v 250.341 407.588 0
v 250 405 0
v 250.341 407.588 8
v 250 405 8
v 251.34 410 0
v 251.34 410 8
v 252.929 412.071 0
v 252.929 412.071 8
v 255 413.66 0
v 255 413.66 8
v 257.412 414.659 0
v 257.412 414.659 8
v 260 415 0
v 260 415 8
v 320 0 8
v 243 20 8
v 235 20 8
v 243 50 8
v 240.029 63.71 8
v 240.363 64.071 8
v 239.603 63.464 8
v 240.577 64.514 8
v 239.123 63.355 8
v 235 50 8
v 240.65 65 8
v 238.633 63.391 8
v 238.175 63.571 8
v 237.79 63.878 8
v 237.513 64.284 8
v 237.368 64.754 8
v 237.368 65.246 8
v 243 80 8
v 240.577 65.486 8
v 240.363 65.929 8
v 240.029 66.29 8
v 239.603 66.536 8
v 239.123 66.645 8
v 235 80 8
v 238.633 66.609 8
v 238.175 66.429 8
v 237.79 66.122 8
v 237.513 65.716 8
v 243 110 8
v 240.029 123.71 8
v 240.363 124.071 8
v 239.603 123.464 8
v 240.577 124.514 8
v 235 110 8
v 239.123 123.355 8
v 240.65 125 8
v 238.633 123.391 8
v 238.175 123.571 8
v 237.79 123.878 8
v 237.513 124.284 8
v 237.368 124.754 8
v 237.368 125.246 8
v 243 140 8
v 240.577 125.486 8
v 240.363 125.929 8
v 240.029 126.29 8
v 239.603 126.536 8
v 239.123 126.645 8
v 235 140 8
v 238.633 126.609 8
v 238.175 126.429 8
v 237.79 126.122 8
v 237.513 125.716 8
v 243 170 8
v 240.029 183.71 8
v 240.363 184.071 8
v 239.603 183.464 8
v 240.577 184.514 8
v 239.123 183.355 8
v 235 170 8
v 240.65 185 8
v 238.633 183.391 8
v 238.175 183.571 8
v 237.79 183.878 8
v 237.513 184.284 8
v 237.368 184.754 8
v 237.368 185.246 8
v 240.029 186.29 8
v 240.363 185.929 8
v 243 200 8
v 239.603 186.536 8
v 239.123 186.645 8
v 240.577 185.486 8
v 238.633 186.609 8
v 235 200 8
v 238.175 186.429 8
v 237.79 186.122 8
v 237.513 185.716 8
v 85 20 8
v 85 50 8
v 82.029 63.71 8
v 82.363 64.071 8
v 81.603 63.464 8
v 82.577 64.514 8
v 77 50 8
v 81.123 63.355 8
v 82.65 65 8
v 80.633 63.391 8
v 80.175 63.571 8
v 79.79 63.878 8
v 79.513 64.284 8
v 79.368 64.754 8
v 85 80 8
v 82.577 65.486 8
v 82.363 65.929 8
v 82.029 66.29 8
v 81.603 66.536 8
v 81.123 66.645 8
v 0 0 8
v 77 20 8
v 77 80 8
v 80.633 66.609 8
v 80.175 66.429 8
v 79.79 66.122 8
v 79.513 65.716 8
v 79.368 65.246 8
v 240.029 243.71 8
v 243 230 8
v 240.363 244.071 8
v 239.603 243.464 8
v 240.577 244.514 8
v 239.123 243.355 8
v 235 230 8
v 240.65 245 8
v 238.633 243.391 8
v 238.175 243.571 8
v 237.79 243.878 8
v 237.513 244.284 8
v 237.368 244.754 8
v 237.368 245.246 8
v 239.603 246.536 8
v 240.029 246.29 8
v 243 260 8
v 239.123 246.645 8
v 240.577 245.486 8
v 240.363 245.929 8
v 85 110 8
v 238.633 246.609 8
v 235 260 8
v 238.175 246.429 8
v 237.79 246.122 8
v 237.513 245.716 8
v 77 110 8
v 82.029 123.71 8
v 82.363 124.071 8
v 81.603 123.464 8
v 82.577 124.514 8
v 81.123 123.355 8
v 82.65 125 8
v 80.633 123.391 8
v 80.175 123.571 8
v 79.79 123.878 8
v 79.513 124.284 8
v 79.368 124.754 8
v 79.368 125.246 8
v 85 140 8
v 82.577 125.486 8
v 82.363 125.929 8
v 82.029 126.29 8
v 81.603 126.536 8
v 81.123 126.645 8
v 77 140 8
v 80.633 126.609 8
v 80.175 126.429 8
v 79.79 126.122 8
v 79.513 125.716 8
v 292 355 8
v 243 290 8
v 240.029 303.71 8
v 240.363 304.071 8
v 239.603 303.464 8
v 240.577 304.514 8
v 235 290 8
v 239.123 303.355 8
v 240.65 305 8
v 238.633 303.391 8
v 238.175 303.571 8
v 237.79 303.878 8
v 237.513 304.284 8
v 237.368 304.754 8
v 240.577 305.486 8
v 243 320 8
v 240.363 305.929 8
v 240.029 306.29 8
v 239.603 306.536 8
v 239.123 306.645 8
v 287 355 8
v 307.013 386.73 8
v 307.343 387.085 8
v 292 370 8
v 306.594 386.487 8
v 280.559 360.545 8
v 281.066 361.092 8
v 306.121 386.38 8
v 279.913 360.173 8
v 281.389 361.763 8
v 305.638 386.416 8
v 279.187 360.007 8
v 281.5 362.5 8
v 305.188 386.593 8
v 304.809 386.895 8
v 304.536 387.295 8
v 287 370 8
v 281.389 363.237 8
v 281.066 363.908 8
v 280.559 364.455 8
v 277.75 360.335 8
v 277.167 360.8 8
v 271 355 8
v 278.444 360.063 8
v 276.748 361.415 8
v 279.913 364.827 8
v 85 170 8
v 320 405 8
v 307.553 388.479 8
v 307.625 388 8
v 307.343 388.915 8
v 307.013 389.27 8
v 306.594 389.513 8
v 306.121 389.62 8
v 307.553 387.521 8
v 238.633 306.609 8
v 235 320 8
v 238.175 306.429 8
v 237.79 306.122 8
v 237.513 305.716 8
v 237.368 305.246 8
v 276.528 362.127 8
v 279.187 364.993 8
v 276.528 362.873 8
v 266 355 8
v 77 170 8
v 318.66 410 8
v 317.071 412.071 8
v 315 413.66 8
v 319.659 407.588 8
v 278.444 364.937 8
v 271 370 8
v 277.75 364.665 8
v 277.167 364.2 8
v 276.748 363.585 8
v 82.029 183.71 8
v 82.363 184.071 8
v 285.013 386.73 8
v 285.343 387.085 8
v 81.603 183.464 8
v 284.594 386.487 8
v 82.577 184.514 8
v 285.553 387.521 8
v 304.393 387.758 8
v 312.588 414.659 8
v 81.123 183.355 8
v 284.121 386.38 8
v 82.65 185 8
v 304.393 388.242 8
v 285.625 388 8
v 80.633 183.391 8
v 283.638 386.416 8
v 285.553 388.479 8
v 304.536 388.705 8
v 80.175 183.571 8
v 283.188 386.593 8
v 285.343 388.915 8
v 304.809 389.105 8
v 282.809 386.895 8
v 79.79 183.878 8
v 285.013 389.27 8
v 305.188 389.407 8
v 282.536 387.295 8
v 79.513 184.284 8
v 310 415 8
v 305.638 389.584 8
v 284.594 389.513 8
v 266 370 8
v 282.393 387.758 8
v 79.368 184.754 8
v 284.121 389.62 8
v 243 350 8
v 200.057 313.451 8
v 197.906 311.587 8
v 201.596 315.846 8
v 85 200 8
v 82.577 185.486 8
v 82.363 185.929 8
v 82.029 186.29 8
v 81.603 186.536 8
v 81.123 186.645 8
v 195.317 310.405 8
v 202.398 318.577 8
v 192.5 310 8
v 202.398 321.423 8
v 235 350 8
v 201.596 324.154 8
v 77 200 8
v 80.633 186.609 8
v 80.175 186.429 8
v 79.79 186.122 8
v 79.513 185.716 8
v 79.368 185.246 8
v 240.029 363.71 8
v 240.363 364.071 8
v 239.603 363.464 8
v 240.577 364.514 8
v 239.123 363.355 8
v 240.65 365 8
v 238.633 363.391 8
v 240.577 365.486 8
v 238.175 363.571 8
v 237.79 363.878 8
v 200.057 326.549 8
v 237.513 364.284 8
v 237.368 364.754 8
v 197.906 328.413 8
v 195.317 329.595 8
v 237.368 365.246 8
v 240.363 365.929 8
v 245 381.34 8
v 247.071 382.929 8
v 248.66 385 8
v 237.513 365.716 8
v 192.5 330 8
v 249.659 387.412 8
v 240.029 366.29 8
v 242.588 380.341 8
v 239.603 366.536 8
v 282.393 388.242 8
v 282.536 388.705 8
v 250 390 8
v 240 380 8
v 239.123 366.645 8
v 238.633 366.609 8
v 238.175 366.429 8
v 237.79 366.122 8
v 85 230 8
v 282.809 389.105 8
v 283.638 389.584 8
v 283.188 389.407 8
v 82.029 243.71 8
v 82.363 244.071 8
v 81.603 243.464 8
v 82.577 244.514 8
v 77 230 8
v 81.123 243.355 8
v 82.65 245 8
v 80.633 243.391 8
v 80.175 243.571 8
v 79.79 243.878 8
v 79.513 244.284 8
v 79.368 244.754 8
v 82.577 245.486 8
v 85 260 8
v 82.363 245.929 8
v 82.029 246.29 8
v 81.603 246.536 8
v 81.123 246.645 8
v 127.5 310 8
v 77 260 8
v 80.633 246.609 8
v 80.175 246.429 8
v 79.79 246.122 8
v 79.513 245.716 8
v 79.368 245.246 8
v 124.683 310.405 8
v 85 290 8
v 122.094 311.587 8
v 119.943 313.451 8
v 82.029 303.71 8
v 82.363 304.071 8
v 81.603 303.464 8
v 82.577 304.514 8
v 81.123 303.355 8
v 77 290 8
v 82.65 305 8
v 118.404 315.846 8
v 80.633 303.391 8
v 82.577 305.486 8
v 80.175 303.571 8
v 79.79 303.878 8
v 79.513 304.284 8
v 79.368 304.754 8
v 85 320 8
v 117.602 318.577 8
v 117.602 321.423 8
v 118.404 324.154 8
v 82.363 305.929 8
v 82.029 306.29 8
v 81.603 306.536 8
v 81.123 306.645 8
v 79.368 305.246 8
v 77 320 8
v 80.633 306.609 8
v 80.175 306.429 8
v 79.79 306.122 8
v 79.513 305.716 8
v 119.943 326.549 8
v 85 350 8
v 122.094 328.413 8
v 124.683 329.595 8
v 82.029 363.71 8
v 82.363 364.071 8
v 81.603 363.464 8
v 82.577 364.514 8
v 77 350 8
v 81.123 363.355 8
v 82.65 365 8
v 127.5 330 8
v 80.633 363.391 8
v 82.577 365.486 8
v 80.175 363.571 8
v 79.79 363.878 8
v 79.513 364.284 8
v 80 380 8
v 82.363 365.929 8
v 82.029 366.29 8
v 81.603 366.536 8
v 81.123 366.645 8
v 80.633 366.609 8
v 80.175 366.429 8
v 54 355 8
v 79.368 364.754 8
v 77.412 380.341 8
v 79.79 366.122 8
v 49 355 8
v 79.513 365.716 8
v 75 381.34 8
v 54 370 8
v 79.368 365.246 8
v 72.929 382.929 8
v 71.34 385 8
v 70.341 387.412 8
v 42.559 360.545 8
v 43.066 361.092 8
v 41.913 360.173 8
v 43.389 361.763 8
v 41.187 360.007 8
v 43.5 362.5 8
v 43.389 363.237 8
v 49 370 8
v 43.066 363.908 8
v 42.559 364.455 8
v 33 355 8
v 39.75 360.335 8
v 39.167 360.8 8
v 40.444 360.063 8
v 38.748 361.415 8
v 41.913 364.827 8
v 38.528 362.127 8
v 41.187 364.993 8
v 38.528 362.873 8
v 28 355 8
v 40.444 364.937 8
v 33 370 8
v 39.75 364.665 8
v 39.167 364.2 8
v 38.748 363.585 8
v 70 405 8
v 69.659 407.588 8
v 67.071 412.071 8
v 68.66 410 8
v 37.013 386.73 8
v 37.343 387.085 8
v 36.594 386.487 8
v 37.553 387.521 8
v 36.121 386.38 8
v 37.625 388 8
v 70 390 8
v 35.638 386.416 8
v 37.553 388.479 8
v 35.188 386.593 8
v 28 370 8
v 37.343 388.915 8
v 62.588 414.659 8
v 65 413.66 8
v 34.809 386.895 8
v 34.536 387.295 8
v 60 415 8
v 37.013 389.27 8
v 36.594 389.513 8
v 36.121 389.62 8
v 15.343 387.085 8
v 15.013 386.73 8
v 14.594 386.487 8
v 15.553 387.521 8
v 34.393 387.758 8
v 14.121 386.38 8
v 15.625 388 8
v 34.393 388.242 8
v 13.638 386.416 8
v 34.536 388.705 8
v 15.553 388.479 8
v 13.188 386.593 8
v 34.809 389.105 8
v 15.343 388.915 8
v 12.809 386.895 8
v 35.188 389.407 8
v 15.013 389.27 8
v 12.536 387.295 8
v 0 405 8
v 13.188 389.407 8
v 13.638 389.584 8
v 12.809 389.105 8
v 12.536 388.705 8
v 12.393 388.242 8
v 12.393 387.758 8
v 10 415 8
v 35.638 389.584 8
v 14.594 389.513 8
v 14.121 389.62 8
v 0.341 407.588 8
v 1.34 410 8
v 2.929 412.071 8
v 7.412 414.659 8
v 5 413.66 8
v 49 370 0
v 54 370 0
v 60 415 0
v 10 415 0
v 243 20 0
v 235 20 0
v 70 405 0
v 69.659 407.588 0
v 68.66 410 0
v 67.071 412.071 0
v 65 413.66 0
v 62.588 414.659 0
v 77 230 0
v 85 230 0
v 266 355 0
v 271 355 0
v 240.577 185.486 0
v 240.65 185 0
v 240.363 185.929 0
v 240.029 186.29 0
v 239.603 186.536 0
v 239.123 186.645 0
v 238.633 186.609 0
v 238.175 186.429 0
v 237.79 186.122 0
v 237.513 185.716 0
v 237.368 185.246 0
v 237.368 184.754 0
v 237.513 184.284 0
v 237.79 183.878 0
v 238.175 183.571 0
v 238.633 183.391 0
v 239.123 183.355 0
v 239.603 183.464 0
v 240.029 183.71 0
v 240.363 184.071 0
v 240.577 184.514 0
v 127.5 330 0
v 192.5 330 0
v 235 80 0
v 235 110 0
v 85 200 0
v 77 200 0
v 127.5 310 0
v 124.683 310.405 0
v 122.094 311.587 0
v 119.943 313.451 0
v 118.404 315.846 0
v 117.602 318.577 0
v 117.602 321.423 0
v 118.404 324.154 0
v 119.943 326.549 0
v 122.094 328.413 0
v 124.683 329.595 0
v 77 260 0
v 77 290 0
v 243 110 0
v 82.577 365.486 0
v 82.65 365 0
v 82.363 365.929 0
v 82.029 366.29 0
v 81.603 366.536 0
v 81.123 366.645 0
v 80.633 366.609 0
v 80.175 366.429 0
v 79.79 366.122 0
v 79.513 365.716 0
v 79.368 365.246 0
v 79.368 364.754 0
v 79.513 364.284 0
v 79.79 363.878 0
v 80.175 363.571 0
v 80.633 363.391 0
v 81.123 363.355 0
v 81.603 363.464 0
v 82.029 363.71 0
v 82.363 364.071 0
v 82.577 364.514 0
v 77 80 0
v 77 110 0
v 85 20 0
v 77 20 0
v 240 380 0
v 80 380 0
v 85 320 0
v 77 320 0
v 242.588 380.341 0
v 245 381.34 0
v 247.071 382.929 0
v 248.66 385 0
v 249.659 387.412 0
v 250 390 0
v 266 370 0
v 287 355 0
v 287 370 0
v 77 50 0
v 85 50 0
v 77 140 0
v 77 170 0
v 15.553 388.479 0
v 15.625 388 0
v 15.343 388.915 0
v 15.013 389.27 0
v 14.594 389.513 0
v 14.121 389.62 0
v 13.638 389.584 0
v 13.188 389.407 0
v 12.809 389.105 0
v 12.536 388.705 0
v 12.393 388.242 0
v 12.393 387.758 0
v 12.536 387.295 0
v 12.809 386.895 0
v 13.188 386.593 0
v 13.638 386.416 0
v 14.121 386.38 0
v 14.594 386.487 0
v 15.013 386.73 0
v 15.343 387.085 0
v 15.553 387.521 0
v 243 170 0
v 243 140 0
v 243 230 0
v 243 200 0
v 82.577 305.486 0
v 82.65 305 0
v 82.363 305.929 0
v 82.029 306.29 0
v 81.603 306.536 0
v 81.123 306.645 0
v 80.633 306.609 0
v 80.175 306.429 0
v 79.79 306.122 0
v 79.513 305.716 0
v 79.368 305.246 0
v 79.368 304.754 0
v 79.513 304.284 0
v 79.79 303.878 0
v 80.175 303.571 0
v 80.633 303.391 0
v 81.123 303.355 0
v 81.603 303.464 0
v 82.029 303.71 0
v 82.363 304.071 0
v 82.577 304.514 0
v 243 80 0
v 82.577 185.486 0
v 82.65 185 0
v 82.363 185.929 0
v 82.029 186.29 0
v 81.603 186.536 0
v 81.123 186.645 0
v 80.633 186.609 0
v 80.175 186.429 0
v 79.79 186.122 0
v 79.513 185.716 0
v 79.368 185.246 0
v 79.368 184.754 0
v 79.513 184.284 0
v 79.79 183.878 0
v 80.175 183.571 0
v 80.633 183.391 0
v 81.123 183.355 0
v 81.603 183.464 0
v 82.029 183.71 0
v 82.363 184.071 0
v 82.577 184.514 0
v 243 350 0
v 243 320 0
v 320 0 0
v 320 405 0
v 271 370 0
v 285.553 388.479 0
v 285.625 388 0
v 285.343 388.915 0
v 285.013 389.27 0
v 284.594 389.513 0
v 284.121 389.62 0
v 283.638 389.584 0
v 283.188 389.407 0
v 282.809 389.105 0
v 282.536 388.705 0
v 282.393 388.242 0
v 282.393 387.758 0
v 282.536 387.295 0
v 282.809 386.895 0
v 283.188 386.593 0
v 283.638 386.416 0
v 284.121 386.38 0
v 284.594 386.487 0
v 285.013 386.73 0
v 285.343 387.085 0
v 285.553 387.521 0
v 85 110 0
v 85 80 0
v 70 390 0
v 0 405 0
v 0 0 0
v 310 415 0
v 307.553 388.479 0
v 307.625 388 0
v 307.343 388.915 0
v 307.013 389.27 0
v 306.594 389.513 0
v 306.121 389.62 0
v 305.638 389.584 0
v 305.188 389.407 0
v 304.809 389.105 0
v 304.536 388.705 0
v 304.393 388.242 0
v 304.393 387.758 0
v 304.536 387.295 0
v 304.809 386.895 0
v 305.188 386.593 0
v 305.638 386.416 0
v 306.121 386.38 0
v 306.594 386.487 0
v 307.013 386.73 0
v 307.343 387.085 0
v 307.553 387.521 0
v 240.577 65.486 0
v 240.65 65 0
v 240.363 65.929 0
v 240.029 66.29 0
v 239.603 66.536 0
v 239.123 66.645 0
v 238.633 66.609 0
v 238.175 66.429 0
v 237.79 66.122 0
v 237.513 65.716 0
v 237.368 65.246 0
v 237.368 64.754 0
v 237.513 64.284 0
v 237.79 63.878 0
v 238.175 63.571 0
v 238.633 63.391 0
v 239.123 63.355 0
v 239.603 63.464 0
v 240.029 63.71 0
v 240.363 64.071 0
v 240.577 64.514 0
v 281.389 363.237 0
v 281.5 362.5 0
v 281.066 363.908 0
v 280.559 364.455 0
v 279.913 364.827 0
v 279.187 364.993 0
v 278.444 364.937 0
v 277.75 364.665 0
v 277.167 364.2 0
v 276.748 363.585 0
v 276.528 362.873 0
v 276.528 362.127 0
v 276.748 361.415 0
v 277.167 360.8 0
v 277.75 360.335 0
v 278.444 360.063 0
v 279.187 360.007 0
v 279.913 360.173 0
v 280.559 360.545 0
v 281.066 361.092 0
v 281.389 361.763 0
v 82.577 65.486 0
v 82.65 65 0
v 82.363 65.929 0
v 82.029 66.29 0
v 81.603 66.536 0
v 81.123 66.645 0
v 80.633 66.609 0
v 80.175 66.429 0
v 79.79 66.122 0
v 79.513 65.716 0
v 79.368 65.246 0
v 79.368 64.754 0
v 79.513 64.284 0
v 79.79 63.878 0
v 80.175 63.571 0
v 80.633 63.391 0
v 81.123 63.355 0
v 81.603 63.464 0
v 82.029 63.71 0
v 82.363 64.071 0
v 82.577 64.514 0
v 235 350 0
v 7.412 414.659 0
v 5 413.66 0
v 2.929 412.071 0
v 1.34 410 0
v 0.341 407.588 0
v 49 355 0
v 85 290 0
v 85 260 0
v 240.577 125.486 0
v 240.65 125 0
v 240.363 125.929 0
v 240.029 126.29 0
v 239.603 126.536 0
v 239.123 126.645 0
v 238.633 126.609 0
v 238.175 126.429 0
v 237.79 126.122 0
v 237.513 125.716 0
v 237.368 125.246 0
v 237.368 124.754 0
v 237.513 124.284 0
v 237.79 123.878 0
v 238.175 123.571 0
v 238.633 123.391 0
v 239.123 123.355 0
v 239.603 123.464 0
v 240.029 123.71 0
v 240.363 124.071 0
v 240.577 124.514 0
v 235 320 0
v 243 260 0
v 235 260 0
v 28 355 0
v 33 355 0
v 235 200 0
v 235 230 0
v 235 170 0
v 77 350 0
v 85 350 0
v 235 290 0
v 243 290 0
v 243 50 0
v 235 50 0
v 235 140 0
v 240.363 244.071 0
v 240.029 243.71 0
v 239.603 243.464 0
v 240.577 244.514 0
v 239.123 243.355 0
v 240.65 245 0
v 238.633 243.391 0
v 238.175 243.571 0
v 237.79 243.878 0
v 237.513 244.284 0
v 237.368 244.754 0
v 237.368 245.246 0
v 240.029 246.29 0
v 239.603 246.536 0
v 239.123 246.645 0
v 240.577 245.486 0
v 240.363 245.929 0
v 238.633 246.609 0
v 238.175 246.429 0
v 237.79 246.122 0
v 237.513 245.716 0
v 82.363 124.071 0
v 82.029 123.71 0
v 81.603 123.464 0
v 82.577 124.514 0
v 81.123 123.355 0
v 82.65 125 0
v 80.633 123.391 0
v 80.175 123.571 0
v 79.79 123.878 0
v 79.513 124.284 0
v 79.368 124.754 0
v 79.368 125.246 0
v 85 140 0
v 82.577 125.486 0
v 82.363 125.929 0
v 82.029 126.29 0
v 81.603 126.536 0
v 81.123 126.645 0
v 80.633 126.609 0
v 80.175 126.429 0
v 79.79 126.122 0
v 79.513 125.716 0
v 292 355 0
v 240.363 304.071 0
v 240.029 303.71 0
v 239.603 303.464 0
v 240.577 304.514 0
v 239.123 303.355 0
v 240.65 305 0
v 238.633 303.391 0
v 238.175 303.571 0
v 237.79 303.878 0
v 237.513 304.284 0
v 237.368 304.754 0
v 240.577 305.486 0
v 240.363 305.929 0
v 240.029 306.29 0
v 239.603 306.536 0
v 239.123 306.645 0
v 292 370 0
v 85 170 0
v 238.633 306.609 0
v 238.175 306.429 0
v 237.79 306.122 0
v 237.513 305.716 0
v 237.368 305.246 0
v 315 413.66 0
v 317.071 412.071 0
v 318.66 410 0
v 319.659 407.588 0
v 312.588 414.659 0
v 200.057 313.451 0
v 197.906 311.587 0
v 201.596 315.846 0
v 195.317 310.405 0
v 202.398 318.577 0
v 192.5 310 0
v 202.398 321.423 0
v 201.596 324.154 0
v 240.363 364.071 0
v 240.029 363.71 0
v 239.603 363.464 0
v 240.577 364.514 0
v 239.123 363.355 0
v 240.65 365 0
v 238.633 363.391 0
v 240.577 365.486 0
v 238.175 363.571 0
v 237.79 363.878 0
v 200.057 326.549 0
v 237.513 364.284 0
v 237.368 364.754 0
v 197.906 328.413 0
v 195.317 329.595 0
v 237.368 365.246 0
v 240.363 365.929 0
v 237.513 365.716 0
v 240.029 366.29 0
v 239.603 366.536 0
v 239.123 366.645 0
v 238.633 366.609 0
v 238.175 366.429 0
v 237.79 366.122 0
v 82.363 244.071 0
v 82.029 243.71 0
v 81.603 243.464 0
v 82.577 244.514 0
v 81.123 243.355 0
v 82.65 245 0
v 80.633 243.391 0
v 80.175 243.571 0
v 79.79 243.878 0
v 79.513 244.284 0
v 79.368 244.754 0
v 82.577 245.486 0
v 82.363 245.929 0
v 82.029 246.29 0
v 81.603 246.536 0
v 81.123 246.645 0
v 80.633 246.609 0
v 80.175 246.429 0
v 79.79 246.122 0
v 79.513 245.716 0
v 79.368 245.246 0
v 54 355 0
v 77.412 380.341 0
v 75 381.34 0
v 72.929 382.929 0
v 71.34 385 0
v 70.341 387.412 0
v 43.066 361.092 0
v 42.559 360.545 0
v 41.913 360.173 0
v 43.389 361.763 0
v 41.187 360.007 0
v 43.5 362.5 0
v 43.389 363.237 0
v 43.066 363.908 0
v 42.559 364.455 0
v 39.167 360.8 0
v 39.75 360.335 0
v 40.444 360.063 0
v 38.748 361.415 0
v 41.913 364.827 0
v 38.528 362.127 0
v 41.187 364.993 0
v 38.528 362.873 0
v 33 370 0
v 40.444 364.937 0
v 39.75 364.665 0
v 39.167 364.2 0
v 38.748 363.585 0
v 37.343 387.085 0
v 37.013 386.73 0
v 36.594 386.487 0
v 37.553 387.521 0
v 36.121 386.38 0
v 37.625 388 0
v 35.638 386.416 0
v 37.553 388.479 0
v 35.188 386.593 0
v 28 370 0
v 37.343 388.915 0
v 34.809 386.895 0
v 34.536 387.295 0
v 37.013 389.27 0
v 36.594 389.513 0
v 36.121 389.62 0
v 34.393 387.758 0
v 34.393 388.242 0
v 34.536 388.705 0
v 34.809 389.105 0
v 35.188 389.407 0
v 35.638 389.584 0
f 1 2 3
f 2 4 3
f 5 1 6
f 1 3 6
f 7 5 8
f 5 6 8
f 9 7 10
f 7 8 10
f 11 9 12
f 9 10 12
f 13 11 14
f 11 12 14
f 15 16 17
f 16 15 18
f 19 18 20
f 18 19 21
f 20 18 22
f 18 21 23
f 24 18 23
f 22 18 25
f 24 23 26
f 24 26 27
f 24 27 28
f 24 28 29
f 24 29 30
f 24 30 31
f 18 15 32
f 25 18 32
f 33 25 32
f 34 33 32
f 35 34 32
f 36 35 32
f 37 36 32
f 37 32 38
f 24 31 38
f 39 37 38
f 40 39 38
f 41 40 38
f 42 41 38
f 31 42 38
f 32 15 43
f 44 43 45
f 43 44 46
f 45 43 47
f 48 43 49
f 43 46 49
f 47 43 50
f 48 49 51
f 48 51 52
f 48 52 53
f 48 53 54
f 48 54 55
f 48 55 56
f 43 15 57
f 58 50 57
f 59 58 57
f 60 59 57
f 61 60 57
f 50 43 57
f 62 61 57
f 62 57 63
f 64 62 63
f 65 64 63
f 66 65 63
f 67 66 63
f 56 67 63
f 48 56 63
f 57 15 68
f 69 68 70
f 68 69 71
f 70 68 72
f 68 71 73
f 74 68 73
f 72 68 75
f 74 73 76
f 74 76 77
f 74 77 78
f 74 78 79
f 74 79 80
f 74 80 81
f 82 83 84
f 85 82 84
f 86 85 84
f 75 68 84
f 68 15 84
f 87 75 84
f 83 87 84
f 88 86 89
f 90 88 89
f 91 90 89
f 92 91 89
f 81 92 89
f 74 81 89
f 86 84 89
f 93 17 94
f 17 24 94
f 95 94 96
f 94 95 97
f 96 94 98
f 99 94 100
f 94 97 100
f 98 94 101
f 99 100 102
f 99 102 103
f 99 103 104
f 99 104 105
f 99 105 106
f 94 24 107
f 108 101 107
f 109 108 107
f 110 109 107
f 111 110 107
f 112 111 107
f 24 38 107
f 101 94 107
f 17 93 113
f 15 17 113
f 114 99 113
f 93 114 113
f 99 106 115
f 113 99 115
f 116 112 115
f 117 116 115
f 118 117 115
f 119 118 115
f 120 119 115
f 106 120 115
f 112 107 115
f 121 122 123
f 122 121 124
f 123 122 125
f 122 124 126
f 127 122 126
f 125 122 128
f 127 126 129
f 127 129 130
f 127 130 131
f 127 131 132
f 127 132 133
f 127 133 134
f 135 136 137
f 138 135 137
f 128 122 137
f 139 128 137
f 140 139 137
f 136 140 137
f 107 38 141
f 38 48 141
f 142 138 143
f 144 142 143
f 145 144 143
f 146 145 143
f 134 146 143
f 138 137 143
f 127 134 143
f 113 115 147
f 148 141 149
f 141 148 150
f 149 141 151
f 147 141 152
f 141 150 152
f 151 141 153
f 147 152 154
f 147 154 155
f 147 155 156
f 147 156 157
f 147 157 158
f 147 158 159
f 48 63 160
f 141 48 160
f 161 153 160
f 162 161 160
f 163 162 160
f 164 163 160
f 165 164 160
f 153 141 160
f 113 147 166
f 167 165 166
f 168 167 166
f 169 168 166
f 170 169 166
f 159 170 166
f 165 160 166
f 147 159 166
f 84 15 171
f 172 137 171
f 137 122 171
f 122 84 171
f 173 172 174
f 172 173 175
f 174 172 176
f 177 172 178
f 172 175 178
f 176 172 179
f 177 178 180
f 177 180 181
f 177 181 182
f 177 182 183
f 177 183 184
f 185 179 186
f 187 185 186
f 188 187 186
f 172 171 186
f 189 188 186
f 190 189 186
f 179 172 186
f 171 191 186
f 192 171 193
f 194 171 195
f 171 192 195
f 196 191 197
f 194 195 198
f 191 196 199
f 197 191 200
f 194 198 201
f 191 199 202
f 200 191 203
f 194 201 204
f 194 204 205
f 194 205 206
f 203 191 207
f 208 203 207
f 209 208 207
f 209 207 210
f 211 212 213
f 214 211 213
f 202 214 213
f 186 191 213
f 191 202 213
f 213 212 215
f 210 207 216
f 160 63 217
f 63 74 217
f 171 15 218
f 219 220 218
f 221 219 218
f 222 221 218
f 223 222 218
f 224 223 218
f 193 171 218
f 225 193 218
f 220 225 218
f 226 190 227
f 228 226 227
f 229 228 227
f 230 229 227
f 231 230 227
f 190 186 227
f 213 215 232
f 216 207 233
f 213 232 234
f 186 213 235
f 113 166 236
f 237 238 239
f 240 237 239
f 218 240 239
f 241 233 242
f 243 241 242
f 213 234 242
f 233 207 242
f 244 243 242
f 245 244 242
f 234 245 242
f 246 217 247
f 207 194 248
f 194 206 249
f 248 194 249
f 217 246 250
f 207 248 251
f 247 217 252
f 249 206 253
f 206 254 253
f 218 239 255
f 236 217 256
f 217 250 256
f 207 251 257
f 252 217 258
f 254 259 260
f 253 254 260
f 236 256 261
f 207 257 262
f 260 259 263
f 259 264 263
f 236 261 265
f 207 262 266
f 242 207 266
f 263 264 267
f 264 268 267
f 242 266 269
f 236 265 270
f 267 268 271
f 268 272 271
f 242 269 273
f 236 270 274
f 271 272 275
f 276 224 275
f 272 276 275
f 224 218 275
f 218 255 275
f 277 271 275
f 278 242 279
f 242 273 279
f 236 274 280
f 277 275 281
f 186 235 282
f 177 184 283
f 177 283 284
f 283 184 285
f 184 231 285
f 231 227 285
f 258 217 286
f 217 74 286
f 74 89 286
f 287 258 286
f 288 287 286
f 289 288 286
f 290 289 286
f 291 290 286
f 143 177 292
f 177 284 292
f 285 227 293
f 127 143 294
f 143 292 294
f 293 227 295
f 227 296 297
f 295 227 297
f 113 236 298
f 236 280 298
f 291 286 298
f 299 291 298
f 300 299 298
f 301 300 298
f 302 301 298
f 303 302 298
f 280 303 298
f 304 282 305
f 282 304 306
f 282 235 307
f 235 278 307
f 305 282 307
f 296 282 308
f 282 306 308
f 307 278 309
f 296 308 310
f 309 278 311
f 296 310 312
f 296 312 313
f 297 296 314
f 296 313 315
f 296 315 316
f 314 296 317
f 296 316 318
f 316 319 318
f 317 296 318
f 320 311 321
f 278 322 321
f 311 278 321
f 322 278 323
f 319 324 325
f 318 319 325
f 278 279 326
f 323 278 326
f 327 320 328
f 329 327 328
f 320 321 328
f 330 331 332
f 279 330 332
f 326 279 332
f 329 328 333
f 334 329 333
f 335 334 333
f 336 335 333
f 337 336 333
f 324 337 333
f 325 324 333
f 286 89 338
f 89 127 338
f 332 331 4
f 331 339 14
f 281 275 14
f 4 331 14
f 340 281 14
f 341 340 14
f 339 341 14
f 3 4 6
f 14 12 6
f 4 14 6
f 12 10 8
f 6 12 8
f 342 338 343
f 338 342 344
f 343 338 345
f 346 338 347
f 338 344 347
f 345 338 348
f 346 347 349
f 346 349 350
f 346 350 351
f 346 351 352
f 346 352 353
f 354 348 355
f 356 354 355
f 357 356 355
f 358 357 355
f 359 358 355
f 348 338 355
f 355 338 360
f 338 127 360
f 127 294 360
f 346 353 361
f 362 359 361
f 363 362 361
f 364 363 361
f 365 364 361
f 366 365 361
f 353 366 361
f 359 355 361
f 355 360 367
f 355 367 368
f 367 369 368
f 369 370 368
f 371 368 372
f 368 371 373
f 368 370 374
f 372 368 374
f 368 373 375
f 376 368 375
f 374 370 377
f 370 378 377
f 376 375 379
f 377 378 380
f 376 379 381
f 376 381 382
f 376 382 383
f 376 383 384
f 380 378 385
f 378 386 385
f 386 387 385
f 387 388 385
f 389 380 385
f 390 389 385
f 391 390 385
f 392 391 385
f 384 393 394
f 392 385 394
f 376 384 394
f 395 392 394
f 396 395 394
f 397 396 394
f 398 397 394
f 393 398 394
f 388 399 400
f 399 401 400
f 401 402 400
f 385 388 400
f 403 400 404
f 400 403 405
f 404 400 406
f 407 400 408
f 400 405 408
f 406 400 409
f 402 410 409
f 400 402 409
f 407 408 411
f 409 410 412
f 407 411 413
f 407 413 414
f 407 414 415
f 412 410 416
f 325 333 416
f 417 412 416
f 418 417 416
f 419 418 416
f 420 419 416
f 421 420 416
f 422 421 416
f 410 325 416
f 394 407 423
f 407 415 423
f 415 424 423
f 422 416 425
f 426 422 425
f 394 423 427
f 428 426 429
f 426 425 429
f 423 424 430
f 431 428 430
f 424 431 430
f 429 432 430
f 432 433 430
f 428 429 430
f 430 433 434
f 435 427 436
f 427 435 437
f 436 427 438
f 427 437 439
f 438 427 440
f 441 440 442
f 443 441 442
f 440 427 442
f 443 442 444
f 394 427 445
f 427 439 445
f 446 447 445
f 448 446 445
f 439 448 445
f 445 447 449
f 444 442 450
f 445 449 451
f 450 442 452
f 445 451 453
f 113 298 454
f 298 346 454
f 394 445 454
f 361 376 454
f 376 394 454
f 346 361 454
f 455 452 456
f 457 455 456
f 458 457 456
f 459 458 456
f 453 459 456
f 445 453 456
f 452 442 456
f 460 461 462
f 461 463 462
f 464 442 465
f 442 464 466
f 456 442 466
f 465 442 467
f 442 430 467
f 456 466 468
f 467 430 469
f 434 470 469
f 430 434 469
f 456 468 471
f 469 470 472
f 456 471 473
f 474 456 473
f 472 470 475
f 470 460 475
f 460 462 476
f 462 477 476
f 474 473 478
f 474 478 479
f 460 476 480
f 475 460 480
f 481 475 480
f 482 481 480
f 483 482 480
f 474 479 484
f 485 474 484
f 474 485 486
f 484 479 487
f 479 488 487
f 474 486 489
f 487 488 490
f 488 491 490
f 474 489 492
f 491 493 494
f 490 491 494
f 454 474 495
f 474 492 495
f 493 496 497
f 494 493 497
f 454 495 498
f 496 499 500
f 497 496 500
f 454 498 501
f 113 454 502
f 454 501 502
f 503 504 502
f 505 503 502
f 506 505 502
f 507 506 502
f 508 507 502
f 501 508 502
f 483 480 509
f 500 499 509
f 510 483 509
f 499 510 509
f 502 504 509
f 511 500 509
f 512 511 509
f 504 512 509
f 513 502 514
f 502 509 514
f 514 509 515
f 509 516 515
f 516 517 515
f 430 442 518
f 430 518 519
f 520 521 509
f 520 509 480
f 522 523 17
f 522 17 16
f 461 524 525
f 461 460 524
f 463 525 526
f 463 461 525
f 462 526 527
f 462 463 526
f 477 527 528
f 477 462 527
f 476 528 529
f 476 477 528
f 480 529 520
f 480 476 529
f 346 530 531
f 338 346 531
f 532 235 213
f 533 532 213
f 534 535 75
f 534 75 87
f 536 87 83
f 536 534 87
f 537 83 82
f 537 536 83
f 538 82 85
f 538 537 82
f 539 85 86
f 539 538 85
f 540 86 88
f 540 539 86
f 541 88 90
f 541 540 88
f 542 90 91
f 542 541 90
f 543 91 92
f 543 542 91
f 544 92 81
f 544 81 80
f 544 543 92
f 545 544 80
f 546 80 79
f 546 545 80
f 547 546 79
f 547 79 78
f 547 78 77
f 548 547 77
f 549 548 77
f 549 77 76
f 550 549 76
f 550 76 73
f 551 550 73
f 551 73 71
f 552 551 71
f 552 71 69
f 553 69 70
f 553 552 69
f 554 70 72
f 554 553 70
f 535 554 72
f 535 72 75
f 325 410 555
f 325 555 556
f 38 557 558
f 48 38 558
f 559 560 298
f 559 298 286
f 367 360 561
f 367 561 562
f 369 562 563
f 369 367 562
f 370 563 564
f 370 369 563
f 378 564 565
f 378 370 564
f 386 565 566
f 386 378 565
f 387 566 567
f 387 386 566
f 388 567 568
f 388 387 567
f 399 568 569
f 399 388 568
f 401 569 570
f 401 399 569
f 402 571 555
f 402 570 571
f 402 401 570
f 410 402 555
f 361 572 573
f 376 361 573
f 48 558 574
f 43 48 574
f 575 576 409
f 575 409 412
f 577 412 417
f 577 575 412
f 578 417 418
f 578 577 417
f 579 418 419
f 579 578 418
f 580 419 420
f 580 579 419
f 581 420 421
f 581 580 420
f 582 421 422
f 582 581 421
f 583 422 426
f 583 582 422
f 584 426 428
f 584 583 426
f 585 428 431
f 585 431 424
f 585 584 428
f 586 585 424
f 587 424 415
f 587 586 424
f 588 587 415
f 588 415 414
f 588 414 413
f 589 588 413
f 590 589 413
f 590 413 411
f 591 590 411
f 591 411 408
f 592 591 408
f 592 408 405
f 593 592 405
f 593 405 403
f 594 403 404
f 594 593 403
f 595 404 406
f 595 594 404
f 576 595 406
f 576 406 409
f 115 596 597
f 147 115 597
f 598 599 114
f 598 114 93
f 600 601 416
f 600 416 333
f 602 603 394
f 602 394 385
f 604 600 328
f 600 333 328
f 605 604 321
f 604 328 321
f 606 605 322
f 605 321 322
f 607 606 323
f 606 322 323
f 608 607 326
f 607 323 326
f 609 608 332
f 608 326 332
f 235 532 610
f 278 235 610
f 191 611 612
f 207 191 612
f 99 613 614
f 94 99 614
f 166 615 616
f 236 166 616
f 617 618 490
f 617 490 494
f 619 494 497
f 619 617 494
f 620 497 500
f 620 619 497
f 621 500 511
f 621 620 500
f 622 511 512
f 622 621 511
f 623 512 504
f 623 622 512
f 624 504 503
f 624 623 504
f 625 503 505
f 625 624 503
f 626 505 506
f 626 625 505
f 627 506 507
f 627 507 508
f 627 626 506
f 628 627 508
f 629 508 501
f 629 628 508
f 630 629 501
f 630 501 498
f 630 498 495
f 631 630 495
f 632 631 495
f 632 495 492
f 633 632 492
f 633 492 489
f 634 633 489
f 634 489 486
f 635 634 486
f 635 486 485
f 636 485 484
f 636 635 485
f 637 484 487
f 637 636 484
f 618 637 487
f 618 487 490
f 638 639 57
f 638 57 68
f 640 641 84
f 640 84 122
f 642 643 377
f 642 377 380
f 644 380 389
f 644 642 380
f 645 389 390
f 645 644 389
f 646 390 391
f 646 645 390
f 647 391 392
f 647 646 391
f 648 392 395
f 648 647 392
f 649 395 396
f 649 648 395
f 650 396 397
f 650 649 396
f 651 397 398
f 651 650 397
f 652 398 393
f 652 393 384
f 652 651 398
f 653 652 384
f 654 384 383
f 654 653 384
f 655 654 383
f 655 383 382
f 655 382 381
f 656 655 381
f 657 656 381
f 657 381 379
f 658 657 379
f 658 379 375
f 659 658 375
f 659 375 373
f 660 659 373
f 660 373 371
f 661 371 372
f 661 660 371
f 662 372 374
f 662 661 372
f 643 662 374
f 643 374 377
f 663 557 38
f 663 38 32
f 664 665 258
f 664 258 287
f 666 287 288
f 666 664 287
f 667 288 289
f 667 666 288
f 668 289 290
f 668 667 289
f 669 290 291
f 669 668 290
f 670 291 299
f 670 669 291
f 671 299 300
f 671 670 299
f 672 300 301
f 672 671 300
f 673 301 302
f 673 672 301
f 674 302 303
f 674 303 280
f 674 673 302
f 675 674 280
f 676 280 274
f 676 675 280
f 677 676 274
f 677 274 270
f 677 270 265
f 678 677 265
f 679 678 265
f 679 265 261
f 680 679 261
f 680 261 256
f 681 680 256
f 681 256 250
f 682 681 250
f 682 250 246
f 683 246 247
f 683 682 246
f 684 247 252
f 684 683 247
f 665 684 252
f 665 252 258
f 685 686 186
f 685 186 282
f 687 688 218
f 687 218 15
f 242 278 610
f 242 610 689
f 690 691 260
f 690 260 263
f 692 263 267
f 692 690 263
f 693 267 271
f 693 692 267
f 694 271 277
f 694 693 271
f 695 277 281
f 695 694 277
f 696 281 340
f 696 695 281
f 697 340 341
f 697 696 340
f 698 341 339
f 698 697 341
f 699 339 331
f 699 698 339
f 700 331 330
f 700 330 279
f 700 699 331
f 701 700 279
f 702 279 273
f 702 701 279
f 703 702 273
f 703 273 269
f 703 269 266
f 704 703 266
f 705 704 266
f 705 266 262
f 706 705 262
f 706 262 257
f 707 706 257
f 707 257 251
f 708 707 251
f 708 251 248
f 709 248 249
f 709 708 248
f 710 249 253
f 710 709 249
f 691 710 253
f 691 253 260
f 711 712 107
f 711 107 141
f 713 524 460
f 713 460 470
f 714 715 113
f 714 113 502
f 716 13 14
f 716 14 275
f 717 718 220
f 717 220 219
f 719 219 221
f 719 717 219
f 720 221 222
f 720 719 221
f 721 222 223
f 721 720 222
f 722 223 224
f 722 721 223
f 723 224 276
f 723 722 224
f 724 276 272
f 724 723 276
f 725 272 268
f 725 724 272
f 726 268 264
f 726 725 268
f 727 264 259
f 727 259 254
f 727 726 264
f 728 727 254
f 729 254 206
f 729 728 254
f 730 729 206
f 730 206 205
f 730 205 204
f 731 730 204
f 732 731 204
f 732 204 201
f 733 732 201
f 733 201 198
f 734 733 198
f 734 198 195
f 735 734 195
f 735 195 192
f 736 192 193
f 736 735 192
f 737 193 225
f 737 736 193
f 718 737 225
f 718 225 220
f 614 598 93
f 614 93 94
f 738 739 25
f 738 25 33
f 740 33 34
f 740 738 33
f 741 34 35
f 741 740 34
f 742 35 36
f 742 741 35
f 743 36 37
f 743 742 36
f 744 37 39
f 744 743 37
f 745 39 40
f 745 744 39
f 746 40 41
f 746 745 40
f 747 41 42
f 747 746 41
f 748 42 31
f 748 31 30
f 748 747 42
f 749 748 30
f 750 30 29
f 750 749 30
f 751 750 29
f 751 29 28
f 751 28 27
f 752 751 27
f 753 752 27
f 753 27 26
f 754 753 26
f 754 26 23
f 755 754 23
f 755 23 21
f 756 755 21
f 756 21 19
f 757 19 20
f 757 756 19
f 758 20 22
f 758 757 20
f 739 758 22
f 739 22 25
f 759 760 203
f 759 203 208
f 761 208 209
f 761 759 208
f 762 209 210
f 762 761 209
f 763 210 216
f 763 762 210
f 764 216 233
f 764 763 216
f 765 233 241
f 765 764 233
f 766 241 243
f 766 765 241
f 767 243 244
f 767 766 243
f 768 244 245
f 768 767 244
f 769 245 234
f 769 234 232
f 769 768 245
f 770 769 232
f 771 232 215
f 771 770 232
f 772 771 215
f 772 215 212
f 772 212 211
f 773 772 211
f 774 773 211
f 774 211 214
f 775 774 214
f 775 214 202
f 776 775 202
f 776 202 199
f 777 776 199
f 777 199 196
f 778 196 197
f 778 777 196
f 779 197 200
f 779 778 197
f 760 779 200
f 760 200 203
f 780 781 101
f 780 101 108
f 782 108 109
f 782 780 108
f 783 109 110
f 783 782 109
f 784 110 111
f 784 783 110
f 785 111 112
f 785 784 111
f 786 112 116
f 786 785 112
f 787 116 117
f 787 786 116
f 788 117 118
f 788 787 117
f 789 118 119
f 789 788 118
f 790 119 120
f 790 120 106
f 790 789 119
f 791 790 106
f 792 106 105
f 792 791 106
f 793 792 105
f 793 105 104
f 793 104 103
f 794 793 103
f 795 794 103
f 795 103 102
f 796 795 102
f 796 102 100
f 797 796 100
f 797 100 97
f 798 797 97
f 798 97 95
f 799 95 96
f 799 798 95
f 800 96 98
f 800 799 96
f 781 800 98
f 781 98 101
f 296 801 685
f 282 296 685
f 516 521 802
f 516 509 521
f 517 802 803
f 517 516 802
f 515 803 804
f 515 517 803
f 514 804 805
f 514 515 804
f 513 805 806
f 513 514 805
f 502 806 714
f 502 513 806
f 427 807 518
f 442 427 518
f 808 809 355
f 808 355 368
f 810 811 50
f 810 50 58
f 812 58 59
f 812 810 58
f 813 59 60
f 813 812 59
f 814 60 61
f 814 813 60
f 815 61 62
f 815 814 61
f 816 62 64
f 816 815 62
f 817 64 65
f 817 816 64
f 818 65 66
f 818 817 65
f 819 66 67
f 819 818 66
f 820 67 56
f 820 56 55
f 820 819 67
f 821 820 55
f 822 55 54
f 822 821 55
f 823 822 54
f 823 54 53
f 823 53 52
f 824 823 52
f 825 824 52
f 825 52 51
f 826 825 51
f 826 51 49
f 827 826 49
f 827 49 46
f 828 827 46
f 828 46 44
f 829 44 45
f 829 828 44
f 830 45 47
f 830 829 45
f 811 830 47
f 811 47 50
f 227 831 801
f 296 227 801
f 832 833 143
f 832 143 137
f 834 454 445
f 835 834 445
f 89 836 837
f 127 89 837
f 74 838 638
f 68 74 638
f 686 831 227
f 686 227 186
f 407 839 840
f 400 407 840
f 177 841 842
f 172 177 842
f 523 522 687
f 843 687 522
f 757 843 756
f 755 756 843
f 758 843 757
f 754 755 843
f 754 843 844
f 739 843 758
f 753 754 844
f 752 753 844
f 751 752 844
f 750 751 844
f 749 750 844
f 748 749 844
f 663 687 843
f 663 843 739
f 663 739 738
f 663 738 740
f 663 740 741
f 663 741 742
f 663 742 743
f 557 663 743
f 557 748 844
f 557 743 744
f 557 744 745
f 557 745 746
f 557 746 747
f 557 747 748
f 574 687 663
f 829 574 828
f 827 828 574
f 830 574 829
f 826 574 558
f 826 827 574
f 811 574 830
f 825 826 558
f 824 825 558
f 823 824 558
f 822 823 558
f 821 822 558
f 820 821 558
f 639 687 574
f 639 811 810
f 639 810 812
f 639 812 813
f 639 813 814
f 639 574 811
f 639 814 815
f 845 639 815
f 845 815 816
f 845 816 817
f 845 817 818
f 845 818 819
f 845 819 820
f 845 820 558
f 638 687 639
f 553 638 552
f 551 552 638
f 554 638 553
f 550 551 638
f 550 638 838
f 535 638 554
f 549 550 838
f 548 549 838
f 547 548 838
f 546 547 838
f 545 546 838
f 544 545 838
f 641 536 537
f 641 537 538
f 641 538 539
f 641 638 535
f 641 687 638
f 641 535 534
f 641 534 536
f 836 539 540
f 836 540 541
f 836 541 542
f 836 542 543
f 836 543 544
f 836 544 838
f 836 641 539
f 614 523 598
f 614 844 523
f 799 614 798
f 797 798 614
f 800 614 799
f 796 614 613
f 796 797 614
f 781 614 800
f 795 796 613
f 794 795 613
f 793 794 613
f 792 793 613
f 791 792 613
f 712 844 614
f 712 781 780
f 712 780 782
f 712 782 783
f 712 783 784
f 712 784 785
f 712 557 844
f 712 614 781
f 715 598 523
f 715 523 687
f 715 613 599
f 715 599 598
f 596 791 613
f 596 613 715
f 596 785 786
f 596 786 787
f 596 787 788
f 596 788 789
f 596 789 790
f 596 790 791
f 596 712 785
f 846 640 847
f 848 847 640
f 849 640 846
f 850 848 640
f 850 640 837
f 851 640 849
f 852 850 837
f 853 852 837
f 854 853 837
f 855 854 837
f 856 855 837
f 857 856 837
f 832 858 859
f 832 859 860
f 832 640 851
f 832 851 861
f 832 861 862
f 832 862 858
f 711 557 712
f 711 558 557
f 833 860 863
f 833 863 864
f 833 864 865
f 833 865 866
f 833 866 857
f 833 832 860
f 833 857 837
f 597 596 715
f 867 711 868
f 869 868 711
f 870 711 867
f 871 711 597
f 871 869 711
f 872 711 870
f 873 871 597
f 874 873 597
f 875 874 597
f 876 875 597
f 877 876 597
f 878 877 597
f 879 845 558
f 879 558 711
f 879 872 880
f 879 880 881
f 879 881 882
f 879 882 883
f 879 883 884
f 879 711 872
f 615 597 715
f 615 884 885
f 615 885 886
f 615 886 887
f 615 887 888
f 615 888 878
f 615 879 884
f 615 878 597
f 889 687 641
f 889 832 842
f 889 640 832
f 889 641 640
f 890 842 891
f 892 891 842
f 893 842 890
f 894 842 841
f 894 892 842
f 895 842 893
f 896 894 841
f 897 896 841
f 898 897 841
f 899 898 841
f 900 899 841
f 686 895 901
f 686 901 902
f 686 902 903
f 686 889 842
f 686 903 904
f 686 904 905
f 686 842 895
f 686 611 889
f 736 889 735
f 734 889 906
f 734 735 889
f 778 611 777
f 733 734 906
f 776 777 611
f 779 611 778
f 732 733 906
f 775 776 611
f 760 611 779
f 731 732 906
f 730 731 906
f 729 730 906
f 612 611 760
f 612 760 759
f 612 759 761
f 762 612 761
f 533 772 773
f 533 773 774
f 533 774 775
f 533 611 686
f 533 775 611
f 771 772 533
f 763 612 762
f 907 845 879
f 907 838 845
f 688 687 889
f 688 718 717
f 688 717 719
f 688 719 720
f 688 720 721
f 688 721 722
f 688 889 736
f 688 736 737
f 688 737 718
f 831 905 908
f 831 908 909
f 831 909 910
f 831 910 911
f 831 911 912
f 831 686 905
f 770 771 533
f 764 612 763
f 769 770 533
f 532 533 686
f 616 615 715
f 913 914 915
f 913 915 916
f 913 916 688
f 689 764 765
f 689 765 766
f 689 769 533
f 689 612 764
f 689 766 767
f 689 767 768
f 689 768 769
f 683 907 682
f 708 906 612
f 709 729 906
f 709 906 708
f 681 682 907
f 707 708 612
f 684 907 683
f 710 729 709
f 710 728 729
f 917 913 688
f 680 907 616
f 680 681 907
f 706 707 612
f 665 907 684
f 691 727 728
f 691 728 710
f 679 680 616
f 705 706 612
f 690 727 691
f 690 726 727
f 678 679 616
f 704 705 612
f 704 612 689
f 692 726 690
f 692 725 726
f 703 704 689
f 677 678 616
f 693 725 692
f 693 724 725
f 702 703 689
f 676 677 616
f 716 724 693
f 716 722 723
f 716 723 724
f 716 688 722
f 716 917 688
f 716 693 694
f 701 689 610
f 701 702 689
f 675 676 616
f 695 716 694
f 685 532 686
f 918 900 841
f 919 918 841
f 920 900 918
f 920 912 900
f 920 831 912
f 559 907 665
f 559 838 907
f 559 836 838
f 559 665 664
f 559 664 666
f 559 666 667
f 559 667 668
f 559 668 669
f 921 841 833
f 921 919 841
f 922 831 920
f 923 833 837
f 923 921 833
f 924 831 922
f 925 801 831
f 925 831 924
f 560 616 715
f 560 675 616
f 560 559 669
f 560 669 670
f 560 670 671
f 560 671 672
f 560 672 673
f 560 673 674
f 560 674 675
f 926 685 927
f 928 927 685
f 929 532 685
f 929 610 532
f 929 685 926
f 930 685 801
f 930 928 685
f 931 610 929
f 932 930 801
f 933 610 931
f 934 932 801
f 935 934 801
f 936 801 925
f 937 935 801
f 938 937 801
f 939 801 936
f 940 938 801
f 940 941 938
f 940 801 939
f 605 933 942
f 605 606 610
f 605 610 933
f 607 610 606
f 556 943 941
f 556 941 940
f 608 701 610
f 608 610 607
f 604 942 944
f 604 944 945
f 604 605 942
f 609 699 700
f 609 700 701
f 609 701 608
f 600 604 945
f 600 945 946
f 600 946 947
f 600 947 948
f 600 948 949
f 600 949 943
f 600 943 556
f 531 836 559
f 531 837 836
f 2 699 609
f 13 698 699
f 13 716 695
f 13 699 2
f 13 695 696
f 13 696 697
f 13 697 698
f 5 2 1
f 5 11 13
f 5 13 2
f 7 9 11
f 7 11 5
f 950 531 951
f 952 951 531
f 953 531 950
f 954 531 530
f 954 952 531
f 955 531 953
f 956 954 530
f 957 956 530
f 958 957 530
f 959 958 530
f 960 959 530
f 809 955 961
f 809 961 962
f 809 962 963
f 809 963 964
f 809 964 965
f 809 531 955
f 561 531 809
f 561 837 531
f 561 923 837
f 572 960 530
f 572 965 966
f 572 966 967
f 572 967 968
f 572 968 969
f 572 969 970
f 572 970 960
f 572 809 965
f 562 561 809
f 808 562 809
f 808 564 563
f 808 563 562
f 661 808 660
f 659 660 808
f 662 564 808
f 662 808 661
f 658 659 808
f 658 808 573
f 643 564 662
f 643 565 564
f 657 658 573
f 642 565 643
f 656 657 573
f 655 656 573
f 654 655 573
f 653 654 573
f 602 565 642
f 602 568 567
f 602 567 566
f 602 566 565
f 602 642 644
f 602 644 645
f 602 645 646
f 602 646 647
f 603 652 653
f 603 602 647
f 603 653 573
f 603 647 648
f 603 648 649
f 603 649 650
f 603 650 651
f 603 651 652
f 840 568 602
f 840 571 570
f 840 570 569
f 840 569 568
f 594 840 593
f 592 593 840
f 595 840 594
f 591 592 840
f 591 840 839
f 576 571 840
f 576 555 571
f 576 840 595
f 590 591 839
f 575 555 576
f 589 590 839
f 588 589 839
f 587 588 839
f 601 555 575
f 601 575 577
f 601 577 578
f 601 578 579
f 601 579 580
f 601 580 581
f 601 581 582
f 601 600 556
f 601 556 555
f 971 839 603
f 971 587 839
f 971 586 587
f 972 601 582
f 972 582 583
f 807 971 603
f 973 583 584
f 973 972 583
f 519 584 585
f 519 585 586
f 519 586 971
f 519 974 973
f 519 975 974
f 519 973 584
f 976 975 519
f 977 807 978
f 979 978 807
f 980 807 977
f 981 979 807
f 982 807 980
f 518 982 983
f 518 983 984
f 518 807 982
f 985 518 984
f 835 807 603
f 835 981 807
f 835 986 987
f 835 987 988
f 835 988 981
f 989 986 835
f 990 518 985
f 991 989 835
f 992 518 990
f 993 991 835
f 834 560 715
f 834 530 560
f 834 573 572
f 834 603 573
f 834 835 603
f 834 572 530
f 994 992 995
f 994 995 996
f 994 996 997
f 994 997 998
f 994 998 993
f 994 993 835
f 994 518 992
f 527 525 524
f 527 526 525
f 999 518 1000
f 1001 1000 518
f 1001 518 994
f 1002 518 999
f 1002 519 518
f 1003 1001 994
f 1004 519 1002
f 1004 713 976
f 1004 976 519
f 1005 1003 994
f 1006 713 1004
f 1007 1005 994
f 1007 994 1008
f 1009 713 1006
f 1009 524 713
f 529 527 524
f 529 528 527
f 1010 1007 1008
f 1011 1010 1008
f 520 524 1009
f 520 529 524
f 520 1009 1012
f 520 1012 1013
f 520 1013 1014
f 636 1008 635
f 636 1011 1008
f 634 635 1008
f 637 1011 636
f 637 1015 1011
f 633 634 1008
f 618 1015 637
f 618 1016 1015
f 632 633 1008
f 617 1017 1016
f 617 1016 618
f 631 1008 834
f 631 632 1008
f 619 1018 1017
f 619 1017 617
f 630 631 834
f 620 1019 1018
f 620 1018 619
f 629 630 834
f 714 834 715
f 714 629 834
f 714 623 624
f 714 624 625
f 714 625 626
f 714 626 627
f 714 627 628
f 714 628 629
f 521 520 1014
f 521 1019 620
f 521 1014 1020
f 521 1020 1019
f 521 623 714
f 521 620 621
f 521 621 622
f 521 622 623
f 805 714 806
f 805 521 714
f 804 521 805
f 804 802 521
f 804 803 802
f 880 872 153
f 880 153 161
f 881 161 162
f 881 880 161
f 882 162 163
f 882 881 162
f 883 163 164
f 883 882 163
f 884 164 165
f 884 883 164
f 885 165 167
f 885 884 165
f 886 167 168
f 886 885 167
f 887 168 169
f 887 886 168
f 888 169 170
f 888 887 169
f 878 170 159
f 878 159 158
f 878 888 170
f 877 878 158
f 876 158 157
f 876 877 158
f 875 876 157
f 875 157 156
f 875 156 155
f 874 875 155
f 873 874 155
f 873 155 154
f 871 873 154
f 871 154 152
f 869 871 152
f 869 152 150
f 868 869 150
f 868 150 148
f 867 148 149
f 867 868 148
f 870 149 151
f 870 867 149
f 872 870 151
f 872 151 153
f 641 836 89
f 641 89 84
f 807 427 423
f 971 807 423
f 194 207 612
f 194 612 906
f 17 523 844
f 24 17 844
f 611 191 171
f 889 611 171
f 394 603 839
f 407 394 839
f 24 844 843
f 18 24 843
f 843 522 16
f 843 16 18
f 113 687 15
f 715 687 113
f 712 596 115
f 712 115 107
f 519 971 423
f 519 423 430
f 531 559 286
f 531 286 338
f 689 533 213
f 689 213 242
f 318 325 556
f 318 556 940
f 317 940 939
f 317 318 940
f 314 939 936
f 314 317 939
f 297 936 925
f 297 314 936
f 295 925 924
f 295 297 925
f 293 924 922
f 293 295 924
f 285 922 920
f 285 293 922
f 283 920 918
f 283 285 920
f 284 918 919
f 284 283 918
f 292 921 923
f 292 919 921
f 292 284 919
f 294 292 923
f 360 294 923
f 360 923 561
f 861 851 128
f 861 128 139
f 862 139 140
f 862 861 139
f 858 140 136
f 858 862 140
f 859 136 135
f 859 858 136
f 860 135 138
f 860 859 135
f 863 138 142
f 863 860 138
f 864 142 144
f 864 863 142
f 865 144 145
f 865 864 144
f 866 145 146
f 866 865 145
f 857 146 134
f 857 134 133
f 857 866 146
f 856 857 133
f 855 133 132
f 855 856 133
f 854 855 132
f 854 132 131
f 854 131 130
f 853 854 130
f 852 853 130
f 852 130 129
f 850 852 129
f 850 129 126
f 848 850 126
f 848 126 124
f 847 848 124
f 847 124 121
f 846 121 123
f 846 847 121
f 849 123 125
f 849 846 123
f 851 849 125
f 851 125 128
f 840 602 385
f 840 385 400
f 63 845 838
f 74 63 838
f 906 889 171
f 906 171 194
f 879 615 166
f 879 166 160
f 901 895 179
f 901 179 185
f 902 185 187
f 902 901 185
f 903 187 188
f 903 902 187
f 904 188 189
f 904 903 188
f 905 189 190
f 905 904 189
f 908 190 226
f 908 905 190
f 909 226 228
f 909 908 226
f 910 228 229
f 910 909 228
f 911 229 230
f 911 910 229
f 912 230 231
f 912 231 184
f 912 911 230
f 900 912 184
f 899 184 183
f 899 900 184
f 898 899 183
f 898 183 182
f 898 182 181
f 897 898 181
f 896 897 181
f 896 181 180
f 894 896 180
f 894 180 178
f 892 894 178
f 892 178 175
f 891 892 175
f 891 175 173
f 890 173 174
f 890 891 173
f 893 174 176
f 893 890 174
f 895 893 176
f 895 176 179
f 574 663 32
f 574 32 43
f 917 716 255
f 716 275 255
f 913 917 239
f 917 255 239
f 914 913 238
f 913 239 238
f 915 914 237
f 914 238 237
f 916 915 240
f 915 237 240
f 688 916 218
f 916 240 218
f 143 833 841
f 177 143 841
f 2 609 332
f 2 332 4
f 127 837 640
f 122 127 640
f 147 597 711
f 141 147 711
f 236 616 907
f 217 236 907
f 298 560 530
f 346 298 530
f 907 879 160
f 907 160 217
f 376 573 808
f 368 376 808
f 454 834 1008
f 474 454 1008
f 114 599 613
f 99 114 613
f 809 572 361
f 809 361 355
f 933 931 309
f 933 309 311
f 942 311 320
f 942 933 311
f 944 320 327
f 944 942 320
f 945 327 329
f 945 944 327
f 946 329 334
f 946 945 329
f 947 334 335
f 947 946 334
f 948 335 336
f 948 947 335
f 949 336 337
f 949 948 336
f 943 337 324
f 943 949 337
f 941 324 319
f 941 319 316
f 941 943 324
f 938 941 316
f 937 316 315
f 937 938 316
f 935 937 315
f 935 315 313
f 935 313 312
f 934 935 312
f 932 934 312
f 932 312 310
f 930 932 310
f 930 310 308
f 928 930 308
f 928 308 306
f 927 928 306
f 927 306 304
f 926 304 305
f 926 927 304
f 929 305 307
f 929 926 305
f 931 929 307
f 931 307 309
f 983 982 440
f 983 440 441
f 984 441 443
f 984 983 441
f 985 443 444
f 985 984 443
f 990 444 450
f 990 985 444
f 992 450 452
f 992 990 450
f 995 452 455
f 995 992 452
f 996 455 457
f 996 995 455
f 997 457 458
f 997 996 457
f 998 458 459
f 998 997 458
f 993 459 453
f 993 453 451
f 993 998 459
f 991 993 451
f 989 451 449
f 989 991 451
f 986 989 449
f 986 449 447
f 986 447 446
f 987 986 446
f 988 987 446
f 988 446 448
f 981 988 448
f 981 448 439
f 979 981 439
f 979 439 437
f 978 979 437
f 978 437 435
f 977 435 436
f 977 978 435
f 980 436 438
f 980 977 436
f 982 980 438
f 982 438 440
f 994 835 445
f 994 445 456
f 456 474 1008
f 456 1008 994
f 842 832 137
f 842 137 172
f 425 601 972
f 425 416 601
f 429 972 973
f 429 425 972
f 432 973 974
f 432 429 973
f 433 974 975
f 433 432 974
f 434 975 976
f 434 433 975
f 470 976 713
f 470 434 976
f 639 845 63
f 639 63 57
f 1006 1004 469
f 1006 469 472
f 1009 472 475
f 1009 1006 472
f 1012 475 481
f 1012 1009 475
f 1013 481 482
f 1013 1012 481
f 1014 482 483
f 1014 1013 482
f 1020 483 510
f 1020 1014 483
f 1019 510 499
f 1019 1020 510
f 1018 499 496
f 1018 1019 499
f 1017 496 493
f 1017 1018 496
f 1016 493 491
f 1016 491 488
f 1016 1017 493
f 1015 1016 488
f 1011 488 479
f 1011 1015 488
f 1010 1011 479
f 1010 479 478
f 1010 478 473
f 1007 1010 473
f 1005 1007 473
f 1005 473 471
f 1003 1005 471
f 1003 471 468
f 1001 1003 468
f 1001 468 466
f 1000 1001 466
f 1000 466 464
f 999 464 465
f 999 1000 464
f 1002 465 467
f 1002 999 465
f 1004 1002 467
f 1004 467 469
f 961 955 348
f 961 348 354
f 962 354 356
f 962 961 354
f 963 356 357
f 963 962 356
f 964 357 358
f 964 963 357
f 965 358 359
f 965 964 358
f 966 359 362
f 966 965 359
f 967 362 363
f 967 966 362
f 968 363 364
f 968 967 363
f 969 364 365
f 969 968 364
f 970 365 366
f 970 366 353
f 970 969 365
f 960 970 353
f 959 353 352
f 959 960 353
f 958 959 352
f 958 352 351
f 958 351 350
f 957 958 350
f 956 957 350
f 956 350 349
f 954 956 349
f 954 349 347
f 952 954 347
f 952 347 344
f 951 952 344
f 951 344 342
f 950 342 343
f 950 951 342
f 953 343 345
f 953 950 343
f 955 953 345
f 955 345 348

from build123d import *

# Parameters (mm, degrees)
SKETCH1_R           = 1.625
SKETCH1_R_2         = 2.5
SKETCH1_R_3         = 1.65
SKETCH1_W           = 8
SKETCH1_H           = 30
SKETCH1_W_2         = 5
SKETCH1_H_2         = 15
BOSS_EXTRUDE1_DEPTH = 8
FILLET1_R           = 10
CUT_EXTRUDE1_DEPTH  = 9


with BuildPart() as part:
    # Sketch1 → Boss-Extrude1 (new body)
    with BuildSketch(Plane.XY):
        Polygon((70, 380), (250, 380), (250, 415), (320, 415), (320, 0), (0, 0), (0, 415), (70, 415), align=None)
        with Locations((14, 388)):
            Circle(SKETCH1_R, mode=Mode.SUBTRACT)
        with Locations((36, 388)):
            Circle(SKETCH1_R, mode=Mode.SUBTRACT)
        with Locations((41, 362.5)):
            Circle(SKETCH1_R_2, mode=Mode.SUBTRACT)
        with Locations((279, 362.5)):
            Circle(SKETCH1_R_2, mode=Mode.SUBTRACT)
        with Locations((284, 388)):
            Circle(SKETCH1_R, mode=Mode.SUBTRACT)
        with Locations((306, 388)):
            Circle(SKETCH1_R, mode=Mode.SUBTRACT)
        with Locations((239, 365)):
            Circle(SKETCH1_R_3, mode=Mode.SUBTRACT)
        with Locations((81, 365)):
            Circle(SKETCH1_R_3, mode=Mode.SUBTRACT)
        with Locations((239, 305)):
            Circle(SKETCH1_R_3, mode=Mode.SUBTRACT)
        with Locations((81, 305)):
            Circle(SKETCH1_R_3, mode=Mode.SUBTRACT)
        with Locations((239, 245)):
            Circle(SKETCH1_R_3, mode=Mode.SUBTRACT)
        with Locations((81, 245)):
            Circle(SKETCH1_R_3, mode=Mode.SUBTRACT)
        with Locations((239, 185)):
            Circle(SKETCH1_R_3, mode=Mode.SUBTRACT)
        with Locations((81, 185)):
            Circle(SKETCH1_R_3, mode=Mode.SUBTRACT)
        with Locations((239, 125)):
            Circle(SKETCH1_R_3, mode=Mode.SUBTRACT)
        with Locations((81, 125)):
            Circle(SKETCH1_R_3, mode=Mode.SUBTRACT)
        with Locations((239, 65)):
            Circle(SKETCH1_R_3, mode=Mode.SUBTRACT)
        with Locations((81, 65)):
            Circle(SKETCH1_R_3, mode=Mode.SUBTRACT)
        with Locations((81, 35)):
            Rectangle(SKETCH1_W, SKETCH1_H, mode=Mode.SUBTRACT)
        with Locations((30.5, 362.5)):
            Rectangle(SKETCH1_W_2, SKETCH1_H_2, mode=Mode.SUBTRACT)
        with Locations((51.5, 362.5)):
            Rectangle(SKETCH1_W_2, SKETCH1_H_2, mode=Mode.SUBTRACT)
        with Locations((268.5, 362.5)):
            Rectangle(SKETCH1_W_2, SKETCH1_H_2, mode=Mode.SUBTRACT)
        with Locations((289.5, 362.5)):
            Rectangle(SKETCH1_W_2, SKETCH1_H_2, mode=Mode.SUBTRACT)
        with Locations((239, 35)):
            Rectangle(SKETCH1_W, SKETCH1_H, mode=Mode.SUBTRACT)
        with Locations((81, 95)):
            Rectangle(SKETCH1_W, SKETCH1_H, mode=Mode.SUBTRACT)
        with Locations((239, 95)):
            Rectangle(SKETCH1_W, SKETCH1_H, mode=Mode.SUBTRACT)
        with Locations((81, 155)):
            Rectangle(SKETCH1_W, SKETCH1_H, mode=Mode.SUBTRACT)
        with Locations((239, 155)):
            Rectangle(SKETCH1_W, SKETCH1_H, mode=Mode.SUBTRACT)
        with Locations((81, 215)):
            Rectangle(SKETCH1_W, SKETCH1_H, mode=Mode.SUBTRACT)
        with Locations((239, 215)):
            Rectangle(SKETCH1_W, SKETCH1_H, mode=Mode.SUBTRACT)
        with Locations((81, 275)):
            Rectangle(SKETCH1_W, SKETCH1_H, mode=Mode.SUBTRACT)
        with Locations((239, 275)):
            Rectangle(SKETCH1_W, SKETCH1_H, mode=Mode.SUBTRACT)
        with Locations((81, 335)):
            Rectangle(SKETCH1_W, SKETCH1_H, mode=Mode.SUBTRACT)
        with Locations((239, 335)):
            Rectangle(SKETCH1_W, SKETCH1_H, mode=Mode.SUBTRACT)
    extrude(amount=BOSS_EXTRUDE1_DEPTH)

    # Fillet1
    fillet1_edges = [part.edges().sort_by_distance(p)[0] for p in [
        (0, 415, 4),
        (70, 415, 4),
        (70, 380, 4),
        (250, 380, 4),
        (250, 415, 4),
        (320, 415, 4),
    ]]
    fillet(fillet1_edges, radius=FILLET1_R)

    # Sketch2 → Cut-Extrude1 (cut, through all)
    with BuildSketch(Plane.XY.offset(8)):
        with BuildLine():
            Line((127.5, 330), (192.5, 330))
            ThreePointArc((192.5, 330), (202.5, 320), (192.5, 310))
            Line((192.5, 310), (127.5, 310))
            ThreePointArc((127.5, 310), (117.5, 320), (127.5, 330))
        make_face()
    extrude(amount=-CUT_EXTRUDE1_DEPTH, mode=Mode.SUBTRACT)


solid = part.part
